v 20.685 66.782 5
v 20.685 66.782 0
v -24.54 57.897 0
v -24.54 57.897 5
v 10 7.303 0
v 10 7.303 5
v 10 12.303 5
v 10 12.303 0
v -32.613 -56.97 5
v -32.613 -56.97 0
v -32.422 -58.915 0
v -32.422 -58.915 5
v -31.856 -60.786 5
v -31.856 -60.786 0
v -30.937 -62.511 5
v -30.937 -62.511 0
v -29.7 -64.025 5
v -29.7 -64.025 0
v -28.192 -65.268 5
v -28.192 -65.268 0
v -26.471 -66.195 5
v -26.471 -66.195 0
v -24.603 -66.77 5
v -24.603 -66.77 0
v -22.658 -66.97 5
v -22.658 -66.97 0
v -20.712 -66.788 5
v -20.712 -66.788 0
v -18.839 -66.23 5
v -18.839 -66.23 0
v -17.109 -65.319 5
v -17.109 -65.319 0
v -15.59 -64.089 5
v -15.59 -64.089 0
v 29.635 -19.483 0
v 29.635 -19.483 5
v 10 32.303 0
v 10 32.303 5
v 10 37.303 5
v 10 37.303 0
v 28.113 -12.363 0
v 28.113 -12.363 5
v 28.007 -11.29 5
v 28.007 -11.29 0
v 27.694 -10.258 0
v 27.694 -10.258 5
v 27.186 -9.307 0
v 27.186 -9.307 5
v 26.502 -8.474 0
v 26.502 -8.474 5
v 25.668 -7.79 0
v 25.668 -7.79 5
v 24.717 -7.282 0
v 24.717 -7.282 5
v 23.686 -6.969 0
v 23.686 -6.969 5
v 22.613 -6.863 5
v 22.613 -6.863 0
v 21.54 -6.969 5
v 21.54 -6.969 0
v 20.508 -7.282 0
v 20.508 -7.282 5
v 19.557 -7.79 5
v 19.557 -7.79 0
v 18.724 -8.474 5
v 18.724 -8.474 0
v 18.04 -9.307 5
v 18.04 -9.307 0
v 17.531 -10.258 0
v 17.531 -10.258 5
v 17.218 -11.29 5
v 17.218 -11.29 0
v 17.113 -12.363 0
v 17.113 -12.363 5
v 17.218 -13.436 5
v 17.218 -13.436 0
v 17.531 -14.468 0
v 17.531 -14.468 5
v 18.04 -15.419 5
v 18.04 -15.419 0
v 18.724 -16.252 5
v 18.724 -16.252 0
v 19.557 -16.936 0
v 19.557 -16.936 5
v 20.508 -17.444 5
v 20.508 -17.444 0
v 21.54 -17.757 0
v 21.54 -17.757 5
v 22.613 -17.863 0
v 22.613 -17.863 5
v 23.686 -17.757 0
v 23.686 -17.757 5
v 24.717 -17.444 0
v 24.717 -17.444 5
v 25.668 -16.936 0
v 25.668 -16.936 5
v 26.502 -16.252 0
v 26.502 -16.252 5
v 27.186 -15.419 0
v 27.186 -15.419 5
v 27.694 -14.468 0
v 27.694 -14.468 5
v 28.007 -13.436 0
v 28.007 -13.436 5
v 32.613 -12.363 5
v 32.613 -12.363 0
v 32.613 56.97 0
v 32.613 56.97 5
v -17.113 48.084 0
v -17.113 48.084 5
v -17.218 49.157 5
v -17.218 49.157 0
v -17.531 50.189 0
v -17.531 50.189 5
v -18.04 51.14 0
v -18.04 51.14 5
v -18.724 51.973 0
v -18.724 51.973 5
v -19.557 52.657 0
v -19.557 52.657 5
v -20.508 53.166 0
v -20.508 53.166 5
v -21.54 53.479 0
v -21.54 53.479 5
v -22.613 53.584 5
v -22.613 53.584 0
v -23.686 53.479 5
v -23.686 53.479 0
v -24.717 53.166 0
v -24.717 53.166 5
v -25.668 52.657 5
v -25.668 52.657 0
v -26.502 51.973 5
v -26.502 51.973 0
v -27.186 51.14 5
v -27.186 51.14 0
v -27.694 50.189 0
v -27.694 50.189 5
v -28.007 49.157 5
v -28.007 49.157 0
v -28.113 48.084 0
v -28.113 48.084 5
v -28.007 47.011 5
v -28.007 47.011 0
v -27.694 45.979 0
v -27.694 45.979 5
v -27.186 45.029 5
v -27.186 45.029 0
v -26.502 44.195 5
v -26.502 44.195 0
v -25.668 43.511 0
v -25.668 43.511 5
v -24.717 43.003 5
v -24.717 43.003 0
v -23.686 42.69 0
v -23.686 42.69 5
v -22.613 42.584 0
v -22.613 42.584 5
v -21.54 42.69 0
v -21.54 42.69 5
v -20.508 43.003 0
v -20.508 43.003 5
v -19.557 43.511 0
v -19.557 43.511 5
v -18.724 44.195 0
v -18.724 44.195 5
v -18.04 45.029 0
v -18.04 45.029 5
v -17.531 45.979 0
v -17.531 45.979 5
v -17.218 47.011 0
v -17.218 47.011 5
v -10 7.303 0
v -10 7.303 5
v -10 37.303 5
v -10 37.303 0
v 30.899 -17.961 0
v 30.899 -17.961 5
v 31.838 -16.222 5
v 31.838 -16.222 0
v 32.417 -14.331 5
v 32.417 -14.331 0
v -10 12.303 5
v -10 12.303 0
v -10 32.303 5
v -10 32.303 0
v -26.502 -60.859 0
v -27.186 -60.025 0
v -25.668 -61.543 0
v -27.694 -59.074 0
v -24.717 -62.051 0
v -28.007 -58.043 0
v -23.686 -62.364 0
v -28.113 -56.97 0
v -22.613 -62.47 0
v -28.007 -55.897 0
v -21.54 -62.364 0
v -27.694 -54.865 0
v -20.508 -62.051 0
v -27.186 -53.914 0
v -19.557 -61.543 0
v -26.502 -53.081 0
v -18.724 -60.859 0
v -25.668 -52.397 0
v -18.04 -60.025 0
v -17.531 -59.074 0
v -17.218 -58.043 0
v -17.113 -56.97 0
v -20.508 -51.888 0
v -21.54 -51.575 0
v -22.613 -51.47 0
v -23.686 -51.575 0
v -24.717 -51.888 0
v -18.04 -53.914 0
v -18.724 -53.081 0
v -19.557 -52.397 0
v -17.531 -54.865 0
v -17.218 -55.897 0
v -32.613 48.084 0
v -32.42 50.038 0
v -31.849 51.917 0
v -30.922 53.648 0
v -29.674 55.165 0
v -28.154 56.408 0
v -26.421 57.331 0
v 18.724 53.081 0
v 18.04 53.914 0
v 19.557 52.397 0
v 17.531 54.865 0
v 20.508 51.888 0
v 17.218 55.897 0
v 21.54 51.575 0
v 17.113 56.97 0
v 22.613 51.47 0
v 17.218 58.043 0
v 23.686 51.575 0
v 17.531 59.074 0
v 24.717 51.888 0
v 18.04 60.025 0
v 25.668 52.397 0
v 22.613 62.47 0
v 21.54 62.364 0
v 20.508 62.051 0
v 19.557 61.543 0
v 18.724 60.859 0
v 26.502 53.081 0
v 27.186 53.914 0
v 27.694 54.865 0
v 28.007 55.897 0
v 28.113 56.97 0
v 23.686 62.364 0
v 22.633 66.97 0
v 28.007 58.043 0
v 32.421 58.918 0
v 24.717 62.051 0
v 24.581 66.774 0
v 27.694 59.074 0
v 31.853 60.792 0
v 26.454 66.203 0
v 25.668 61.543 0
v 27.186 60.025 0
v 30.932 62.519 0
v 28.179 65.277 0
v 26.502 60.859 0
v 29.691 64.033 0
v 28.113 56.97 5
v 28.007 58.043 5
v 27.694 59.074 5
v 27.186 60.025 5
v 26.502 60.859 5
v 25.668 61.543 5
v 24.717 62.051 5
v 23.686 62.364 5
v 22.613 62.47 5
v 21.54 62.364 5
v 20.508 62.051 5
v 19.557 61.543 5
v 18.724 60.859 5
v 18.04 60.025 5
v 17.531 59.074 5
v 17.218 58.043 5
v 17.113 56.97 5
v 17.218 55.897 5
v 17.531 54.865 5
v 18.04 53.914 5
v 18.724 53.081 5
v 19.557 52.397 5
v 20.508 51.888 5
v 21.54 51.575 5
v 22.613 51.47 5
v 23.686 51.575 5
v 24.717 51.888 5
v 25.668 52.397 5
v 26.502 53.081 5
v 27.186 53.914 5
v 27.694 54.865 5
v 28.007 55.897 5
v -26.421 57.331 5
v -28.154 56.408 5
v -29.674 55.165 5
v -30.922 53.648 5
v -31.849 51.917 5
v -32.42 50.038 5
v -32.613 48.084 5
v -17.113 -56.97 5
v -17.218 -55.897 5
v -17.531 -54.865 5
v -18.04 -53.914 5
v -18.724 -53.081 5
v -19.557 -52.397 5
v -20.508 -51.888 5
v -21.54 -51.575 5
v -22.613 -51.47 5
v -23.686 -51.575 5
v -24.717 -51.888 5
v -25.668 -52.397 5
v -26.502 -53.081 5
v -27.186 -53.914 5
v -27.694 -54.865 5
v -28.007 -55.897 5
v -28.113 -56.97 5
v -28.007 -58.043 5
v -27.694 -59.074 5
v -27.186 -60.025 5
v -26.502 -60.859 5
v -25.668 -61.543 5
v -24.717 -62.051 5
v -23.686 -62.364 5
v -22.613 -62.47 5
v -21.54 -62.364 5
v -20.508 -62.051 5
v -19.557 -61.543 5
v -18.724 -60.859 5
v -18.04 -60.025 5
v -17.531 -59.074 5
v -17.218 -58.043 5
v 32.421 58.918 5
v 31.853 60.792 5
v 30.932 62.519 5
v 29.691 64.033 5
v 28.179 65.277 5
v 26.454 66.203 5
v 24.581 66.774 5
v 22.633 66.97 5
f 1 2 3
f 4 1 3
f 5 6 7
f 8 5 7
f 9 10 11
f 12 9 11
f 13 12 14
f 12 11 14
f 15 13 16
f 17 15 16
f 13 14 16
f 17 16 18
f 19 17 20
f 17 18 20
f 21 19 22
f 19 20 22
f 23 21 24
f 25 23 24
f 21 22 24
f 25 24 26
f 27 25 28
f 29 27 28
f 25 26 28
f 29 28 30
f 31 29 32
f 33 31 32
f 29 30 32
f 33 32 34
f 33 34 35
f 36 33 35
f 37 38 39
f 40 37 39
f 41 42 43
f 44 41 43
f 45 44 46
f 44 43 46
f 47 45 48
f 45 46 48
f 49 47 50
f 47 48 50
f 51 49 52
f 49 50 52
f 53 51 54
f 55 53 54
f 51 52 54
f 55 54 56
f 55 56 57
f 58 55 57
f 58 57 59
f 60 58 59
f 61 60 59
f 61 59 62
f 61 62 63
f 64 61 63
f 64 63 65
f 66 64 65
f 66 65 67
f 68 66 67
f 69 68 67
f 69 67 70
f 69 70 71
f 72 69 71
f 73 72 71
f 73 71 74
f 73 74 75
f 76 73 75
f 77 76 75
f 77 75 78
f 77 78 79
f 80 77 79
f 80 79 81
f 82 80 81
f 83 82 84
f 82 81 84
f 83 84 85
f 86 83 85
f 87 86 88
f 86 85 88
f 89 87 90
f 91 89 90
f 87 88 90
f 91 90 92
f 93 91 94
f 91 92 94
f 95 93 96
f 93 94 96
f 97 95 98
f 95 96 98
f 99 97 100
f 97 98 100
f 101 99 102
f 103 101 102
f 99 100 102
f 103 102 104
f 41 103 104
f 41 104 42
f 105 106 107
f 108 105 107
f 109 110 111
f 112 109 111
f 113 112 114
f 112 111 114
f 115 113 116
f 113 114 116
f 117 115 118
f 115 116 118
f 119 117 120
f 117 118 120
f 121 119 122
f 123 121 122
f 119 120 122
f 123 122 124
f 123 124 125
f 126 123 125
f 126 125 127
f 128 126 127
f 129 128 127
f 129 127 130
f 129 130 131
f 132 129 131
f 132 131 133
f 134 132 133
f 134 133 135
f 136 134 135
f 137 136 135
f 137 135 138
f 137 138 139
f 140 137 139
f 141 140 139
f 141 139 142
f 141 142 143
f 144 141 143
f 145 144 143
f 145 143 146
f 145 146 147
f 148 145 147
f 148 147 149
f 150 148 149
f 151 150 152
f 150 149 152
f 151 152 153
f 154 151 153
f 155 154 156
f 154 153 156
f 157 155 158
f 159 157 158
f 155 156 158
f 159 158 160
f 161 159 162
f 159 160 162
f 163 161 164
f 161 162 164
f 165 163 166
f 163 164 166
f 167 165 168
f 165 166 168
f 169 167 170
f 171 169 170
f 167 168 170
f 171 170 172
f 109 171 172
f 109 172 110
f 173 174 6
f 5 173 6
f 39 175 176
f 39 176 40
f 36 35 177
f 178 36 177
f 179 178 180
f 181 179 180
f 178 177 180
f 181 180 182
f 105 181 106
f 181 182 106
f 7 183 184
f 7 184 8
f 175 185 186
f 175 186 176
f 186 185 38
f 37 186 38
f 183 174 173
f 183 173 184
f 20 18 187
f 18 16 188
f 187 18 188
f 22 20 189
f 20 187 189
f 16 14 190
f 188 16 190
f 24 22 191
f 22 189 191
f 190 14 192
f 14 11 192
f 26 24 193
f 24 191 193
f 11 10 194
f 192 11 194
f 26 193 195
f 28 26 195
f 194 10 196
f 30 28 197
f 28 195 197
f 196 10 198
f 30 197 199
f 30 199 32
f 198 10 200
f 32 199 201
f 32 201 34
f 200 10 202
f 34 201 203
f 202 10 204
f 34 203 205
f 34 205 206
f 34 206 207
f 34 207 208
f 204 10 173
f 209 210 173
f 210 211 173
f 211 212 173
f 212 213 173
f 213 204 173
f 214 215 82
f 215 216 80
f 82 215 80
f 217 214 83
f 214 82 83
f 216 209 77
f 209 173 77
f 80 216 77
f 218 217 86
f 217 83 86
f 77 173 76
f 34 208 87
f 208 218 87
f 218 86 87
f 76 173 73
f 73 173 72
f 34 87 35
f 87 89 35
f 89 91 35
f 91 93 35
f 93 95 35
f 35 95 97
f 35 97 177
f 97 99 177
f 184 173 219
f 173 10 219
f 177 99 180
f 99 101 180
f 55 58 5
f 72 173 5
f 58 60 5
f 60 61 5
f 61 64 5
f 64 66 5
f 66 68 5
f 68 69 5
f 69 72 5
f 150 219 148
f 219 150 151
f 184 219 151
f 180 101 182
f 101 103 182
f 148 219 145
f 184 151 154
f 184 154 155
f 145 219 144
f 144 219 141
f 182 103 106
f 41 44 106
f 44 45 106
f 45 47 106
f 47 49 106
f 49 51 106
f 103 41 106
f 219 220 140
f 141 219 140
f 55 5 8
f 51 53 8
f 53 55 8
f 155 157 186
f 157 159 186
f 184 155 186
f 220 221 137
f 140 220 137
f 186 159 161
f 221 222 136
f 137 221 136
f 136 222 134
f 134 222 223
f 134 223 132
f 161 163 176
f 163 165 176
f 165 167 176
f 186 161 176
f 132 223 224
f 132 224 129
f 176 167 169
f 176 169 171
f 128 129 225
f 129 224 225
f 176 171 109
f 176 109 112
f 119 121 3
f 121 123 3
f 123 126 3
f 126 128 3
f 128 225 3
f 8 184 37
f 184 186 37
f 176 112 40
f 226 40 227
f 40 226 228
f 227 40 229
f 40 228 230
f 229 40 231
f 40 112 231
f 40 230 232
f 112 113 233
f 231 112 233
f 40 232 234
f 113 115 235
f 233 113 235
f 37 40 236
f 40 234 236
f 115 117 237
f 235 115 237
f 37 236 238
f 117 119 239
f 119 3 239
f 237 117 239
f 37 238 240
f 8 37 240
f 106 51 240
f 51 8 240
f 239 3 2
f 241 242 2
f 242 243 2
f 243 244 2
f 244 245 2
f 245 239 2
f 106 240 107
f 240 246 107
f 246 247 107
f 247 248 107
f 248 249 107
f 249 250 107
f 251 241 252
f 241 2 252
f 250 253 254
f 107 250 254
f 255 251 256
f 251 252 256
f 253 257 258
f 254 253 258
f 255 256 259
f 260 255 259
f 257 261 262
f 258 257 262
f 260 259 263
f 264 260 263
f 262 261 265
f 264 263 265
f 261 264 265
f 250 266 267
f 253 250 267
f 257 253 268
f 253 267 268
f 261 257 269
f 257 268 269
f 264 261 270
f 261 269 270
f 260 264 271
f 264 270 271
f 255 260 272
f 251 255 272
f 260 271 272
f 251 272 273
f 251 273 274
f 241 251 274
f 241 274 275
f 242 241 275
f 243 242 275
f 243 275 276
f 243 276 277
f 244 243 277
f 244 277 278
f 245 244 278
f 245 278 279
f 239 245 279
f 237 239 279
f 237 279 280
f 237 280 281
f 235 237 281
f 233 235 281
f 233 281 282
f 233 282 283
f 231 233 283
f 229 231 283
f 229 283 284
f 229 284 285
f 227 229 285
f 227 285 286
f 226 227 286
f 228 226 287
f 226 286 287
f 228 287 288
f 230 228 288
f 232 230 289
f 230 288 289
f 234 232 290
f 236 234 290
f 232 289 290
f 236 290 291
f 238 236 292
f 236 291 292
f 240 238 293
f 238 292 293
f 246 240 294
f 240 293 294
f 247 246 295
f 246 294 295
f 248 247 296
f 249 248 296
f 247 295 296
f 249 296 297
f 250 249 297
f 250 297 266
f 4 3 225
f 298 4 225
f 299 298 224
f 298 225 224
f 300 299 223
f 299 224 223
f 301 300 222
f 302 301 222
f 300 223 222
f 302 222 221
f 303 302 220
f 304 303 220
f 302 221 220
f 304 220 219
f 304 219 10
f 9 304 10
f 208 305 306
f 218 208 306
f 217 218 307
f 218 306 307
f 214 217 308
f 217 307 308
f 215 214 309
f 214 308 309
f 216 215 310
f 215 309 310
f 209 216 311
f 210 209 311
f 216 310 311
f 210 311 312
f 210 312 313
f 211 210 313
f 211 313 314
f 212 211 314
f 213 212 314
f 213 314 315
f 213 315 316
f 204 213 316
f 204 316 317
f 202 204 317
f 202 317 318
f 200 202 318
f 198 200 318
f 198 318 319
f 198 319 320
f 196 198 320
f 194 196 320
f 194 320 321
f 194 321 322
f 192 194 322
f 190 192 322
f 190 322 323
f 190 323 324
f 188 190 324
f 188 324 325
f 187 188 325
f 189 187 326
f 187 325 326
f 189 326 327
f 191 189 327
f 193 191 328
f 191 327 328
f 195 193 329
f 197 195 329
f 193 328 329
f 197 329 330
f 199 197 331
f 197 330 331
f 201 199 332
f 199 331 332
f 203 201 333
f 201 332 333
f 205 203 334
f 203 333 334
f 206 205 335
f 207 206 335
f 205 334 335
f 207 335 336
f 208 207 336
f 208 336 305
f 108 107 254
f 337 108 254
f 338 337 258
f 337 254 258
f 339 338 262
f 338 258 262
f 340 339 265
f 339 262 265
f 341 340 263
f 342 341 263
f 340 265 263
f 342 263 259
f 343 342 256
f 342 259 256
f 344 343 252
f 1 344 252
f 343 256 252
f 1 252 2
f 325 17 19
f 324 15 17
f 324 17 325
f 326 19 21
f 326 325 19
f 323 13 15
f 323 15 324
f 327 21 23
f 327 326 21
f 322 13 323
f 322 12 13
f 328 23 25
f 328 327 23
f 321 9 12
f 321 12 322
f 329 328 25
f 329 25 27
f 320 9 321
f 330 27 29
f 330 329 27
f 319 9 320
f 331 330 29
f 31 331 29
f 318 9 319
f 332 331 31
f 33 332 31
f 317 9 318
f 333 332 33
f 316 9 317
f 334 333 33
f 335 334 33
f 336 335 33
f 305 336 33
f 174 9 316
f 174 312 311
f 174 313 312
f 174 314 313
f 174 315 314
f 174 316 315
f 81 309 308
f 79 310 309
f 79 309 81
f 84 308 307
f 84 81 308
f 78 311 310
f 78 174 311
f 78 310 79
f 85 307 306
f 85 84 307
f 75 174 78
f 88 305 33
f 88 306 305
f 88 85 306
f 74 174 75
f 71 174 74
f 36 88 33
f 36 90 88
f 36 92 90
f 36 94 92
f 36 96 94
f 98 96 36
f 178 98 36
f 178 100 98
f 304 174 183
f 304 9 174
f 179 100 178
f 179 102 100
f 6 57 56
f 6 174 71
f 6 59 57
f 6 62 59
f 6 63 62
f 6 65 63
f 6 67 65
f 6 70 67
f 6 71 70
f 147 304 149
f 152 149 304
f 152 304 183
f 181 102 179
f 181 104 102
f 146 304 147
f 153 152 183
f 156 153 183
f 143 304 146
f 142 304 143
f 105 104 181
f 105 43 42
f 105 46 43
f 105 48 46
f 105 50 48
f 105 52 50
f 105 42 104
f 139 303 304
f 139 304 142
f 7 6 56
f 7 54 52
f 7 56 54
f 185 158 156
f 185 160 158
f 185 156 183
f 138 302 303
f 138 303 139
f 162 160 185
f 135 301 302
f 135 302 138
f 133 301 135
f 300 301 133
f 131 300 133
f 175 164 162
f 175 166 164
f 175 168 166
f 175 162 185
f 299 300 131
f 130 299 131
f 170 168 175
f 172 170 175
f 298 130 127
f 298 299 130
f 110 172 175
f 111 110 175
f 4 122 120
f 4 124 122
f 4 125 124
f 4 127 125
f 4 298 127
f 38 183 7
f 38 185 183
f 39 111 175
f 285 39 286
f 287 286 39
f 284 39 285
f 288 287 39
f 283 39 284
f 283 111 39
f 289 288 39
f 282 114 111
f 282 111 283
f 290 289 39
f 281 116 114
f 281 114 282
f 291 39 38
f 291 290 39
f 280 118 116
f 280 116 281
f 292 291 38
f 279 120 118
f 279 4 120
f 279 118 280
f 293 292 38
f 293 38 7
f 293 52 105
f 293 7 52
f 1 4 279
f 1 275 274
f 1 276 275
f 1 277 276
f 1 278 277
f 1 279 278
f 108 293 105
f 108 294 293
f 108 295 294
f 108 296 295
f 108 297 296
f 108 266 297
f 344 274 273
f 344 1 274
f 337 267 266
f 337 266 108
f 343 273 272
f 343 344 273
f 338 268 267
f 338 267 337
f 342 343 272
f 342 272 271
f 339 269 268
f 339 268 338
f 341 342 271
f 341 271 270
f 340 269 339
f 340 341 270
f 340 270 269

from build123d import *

# Parameters (mm, degrees)
EXTRUDE_1_DEPTH     = 5
SKETCH_2_W          = 20
SKETCH_2_H          = 5
CUT_EXTRUDE_1_DEPTH = 75.656062131
SKETCH_3_R          = 5.5
CUT_EXTRUDE_2_DEPTH = 75.656062131


with BuildPart() as part:
    # Эскиз1 → Бобышка-Вытянуть1 (new body)
    with BuildSketch(Plane.XY):
        with BuildLine():
            Line((-15.590383156, -64.089313216), (29.634829502, -19.482516982))
            ThreePointArc((29.634829502, -19.482516982), (31.838174922, -16.221551312), (32.612606329, -12.362939627))
            Line((32.612606329, -12.362939627), (32.612606329, 56.969735861))
            ThreePointArc((32.612606329, 56.969735861), (28.965607908, 64.692388963), (20.684732142, 66.782141332))
            Line((20.684732142, 66.782141332), (-24.540480515, 57.896601459))
            ThreePointArc((-24.540480515, 57.896601459), (-30.335259431, 54.437197567), (-32.612606329, 48.084195988))
            Line((-32.612606329, 48.084195988), (-32.612606329, -56.969735861))
            ThreePointArc((-32.612606329, -56.969735861), (-26.471218014, -66.195304454), (-15.590383156, -64.089313216))
        make_face()
    extrude(amount=EXTRUDE_1_DEPTH)

    # Эскиз2 → Вырез-Вытянуть1 (cut, through all)
    with BuildSketch(Plane.XY.offset(5)):
        with Locations((0, 34.803398117)):
            Rectangle(SKETCH_2_W, SKETCH_2_H)
        with Locations((0, 9.803398117)):
            Rectangle(SKETCH_2_W, SKETCH_2_H)
    extrude(amount=-CUT_EXTRUDE_1_DEPTH, mode=Mode.SUBTRACT)

    # Эскиз3 → Вырез-Вытянуть2 (cut, through all)
    with BuildSketch(Plane.XY.offset(5)):
        with Locations((22.612606329, 56.969735861)):
            Circle(SKETCH_3_R)
        with Locations((-22.612606329, -56.969735861)):
            Circle(SKETCH_3_R)
        with Locations((-22.612606329, 48.084195988)):
            Circle(SKETCH_3_R)
        with Locations((22.612606329, -12.362939627)):
            Circle(SKETCH_3_R)
    extrude(amount=-CUT_EXTRUDE_2_DEPTH, mode=Mode.SUBTRACT)


solid = part.part
